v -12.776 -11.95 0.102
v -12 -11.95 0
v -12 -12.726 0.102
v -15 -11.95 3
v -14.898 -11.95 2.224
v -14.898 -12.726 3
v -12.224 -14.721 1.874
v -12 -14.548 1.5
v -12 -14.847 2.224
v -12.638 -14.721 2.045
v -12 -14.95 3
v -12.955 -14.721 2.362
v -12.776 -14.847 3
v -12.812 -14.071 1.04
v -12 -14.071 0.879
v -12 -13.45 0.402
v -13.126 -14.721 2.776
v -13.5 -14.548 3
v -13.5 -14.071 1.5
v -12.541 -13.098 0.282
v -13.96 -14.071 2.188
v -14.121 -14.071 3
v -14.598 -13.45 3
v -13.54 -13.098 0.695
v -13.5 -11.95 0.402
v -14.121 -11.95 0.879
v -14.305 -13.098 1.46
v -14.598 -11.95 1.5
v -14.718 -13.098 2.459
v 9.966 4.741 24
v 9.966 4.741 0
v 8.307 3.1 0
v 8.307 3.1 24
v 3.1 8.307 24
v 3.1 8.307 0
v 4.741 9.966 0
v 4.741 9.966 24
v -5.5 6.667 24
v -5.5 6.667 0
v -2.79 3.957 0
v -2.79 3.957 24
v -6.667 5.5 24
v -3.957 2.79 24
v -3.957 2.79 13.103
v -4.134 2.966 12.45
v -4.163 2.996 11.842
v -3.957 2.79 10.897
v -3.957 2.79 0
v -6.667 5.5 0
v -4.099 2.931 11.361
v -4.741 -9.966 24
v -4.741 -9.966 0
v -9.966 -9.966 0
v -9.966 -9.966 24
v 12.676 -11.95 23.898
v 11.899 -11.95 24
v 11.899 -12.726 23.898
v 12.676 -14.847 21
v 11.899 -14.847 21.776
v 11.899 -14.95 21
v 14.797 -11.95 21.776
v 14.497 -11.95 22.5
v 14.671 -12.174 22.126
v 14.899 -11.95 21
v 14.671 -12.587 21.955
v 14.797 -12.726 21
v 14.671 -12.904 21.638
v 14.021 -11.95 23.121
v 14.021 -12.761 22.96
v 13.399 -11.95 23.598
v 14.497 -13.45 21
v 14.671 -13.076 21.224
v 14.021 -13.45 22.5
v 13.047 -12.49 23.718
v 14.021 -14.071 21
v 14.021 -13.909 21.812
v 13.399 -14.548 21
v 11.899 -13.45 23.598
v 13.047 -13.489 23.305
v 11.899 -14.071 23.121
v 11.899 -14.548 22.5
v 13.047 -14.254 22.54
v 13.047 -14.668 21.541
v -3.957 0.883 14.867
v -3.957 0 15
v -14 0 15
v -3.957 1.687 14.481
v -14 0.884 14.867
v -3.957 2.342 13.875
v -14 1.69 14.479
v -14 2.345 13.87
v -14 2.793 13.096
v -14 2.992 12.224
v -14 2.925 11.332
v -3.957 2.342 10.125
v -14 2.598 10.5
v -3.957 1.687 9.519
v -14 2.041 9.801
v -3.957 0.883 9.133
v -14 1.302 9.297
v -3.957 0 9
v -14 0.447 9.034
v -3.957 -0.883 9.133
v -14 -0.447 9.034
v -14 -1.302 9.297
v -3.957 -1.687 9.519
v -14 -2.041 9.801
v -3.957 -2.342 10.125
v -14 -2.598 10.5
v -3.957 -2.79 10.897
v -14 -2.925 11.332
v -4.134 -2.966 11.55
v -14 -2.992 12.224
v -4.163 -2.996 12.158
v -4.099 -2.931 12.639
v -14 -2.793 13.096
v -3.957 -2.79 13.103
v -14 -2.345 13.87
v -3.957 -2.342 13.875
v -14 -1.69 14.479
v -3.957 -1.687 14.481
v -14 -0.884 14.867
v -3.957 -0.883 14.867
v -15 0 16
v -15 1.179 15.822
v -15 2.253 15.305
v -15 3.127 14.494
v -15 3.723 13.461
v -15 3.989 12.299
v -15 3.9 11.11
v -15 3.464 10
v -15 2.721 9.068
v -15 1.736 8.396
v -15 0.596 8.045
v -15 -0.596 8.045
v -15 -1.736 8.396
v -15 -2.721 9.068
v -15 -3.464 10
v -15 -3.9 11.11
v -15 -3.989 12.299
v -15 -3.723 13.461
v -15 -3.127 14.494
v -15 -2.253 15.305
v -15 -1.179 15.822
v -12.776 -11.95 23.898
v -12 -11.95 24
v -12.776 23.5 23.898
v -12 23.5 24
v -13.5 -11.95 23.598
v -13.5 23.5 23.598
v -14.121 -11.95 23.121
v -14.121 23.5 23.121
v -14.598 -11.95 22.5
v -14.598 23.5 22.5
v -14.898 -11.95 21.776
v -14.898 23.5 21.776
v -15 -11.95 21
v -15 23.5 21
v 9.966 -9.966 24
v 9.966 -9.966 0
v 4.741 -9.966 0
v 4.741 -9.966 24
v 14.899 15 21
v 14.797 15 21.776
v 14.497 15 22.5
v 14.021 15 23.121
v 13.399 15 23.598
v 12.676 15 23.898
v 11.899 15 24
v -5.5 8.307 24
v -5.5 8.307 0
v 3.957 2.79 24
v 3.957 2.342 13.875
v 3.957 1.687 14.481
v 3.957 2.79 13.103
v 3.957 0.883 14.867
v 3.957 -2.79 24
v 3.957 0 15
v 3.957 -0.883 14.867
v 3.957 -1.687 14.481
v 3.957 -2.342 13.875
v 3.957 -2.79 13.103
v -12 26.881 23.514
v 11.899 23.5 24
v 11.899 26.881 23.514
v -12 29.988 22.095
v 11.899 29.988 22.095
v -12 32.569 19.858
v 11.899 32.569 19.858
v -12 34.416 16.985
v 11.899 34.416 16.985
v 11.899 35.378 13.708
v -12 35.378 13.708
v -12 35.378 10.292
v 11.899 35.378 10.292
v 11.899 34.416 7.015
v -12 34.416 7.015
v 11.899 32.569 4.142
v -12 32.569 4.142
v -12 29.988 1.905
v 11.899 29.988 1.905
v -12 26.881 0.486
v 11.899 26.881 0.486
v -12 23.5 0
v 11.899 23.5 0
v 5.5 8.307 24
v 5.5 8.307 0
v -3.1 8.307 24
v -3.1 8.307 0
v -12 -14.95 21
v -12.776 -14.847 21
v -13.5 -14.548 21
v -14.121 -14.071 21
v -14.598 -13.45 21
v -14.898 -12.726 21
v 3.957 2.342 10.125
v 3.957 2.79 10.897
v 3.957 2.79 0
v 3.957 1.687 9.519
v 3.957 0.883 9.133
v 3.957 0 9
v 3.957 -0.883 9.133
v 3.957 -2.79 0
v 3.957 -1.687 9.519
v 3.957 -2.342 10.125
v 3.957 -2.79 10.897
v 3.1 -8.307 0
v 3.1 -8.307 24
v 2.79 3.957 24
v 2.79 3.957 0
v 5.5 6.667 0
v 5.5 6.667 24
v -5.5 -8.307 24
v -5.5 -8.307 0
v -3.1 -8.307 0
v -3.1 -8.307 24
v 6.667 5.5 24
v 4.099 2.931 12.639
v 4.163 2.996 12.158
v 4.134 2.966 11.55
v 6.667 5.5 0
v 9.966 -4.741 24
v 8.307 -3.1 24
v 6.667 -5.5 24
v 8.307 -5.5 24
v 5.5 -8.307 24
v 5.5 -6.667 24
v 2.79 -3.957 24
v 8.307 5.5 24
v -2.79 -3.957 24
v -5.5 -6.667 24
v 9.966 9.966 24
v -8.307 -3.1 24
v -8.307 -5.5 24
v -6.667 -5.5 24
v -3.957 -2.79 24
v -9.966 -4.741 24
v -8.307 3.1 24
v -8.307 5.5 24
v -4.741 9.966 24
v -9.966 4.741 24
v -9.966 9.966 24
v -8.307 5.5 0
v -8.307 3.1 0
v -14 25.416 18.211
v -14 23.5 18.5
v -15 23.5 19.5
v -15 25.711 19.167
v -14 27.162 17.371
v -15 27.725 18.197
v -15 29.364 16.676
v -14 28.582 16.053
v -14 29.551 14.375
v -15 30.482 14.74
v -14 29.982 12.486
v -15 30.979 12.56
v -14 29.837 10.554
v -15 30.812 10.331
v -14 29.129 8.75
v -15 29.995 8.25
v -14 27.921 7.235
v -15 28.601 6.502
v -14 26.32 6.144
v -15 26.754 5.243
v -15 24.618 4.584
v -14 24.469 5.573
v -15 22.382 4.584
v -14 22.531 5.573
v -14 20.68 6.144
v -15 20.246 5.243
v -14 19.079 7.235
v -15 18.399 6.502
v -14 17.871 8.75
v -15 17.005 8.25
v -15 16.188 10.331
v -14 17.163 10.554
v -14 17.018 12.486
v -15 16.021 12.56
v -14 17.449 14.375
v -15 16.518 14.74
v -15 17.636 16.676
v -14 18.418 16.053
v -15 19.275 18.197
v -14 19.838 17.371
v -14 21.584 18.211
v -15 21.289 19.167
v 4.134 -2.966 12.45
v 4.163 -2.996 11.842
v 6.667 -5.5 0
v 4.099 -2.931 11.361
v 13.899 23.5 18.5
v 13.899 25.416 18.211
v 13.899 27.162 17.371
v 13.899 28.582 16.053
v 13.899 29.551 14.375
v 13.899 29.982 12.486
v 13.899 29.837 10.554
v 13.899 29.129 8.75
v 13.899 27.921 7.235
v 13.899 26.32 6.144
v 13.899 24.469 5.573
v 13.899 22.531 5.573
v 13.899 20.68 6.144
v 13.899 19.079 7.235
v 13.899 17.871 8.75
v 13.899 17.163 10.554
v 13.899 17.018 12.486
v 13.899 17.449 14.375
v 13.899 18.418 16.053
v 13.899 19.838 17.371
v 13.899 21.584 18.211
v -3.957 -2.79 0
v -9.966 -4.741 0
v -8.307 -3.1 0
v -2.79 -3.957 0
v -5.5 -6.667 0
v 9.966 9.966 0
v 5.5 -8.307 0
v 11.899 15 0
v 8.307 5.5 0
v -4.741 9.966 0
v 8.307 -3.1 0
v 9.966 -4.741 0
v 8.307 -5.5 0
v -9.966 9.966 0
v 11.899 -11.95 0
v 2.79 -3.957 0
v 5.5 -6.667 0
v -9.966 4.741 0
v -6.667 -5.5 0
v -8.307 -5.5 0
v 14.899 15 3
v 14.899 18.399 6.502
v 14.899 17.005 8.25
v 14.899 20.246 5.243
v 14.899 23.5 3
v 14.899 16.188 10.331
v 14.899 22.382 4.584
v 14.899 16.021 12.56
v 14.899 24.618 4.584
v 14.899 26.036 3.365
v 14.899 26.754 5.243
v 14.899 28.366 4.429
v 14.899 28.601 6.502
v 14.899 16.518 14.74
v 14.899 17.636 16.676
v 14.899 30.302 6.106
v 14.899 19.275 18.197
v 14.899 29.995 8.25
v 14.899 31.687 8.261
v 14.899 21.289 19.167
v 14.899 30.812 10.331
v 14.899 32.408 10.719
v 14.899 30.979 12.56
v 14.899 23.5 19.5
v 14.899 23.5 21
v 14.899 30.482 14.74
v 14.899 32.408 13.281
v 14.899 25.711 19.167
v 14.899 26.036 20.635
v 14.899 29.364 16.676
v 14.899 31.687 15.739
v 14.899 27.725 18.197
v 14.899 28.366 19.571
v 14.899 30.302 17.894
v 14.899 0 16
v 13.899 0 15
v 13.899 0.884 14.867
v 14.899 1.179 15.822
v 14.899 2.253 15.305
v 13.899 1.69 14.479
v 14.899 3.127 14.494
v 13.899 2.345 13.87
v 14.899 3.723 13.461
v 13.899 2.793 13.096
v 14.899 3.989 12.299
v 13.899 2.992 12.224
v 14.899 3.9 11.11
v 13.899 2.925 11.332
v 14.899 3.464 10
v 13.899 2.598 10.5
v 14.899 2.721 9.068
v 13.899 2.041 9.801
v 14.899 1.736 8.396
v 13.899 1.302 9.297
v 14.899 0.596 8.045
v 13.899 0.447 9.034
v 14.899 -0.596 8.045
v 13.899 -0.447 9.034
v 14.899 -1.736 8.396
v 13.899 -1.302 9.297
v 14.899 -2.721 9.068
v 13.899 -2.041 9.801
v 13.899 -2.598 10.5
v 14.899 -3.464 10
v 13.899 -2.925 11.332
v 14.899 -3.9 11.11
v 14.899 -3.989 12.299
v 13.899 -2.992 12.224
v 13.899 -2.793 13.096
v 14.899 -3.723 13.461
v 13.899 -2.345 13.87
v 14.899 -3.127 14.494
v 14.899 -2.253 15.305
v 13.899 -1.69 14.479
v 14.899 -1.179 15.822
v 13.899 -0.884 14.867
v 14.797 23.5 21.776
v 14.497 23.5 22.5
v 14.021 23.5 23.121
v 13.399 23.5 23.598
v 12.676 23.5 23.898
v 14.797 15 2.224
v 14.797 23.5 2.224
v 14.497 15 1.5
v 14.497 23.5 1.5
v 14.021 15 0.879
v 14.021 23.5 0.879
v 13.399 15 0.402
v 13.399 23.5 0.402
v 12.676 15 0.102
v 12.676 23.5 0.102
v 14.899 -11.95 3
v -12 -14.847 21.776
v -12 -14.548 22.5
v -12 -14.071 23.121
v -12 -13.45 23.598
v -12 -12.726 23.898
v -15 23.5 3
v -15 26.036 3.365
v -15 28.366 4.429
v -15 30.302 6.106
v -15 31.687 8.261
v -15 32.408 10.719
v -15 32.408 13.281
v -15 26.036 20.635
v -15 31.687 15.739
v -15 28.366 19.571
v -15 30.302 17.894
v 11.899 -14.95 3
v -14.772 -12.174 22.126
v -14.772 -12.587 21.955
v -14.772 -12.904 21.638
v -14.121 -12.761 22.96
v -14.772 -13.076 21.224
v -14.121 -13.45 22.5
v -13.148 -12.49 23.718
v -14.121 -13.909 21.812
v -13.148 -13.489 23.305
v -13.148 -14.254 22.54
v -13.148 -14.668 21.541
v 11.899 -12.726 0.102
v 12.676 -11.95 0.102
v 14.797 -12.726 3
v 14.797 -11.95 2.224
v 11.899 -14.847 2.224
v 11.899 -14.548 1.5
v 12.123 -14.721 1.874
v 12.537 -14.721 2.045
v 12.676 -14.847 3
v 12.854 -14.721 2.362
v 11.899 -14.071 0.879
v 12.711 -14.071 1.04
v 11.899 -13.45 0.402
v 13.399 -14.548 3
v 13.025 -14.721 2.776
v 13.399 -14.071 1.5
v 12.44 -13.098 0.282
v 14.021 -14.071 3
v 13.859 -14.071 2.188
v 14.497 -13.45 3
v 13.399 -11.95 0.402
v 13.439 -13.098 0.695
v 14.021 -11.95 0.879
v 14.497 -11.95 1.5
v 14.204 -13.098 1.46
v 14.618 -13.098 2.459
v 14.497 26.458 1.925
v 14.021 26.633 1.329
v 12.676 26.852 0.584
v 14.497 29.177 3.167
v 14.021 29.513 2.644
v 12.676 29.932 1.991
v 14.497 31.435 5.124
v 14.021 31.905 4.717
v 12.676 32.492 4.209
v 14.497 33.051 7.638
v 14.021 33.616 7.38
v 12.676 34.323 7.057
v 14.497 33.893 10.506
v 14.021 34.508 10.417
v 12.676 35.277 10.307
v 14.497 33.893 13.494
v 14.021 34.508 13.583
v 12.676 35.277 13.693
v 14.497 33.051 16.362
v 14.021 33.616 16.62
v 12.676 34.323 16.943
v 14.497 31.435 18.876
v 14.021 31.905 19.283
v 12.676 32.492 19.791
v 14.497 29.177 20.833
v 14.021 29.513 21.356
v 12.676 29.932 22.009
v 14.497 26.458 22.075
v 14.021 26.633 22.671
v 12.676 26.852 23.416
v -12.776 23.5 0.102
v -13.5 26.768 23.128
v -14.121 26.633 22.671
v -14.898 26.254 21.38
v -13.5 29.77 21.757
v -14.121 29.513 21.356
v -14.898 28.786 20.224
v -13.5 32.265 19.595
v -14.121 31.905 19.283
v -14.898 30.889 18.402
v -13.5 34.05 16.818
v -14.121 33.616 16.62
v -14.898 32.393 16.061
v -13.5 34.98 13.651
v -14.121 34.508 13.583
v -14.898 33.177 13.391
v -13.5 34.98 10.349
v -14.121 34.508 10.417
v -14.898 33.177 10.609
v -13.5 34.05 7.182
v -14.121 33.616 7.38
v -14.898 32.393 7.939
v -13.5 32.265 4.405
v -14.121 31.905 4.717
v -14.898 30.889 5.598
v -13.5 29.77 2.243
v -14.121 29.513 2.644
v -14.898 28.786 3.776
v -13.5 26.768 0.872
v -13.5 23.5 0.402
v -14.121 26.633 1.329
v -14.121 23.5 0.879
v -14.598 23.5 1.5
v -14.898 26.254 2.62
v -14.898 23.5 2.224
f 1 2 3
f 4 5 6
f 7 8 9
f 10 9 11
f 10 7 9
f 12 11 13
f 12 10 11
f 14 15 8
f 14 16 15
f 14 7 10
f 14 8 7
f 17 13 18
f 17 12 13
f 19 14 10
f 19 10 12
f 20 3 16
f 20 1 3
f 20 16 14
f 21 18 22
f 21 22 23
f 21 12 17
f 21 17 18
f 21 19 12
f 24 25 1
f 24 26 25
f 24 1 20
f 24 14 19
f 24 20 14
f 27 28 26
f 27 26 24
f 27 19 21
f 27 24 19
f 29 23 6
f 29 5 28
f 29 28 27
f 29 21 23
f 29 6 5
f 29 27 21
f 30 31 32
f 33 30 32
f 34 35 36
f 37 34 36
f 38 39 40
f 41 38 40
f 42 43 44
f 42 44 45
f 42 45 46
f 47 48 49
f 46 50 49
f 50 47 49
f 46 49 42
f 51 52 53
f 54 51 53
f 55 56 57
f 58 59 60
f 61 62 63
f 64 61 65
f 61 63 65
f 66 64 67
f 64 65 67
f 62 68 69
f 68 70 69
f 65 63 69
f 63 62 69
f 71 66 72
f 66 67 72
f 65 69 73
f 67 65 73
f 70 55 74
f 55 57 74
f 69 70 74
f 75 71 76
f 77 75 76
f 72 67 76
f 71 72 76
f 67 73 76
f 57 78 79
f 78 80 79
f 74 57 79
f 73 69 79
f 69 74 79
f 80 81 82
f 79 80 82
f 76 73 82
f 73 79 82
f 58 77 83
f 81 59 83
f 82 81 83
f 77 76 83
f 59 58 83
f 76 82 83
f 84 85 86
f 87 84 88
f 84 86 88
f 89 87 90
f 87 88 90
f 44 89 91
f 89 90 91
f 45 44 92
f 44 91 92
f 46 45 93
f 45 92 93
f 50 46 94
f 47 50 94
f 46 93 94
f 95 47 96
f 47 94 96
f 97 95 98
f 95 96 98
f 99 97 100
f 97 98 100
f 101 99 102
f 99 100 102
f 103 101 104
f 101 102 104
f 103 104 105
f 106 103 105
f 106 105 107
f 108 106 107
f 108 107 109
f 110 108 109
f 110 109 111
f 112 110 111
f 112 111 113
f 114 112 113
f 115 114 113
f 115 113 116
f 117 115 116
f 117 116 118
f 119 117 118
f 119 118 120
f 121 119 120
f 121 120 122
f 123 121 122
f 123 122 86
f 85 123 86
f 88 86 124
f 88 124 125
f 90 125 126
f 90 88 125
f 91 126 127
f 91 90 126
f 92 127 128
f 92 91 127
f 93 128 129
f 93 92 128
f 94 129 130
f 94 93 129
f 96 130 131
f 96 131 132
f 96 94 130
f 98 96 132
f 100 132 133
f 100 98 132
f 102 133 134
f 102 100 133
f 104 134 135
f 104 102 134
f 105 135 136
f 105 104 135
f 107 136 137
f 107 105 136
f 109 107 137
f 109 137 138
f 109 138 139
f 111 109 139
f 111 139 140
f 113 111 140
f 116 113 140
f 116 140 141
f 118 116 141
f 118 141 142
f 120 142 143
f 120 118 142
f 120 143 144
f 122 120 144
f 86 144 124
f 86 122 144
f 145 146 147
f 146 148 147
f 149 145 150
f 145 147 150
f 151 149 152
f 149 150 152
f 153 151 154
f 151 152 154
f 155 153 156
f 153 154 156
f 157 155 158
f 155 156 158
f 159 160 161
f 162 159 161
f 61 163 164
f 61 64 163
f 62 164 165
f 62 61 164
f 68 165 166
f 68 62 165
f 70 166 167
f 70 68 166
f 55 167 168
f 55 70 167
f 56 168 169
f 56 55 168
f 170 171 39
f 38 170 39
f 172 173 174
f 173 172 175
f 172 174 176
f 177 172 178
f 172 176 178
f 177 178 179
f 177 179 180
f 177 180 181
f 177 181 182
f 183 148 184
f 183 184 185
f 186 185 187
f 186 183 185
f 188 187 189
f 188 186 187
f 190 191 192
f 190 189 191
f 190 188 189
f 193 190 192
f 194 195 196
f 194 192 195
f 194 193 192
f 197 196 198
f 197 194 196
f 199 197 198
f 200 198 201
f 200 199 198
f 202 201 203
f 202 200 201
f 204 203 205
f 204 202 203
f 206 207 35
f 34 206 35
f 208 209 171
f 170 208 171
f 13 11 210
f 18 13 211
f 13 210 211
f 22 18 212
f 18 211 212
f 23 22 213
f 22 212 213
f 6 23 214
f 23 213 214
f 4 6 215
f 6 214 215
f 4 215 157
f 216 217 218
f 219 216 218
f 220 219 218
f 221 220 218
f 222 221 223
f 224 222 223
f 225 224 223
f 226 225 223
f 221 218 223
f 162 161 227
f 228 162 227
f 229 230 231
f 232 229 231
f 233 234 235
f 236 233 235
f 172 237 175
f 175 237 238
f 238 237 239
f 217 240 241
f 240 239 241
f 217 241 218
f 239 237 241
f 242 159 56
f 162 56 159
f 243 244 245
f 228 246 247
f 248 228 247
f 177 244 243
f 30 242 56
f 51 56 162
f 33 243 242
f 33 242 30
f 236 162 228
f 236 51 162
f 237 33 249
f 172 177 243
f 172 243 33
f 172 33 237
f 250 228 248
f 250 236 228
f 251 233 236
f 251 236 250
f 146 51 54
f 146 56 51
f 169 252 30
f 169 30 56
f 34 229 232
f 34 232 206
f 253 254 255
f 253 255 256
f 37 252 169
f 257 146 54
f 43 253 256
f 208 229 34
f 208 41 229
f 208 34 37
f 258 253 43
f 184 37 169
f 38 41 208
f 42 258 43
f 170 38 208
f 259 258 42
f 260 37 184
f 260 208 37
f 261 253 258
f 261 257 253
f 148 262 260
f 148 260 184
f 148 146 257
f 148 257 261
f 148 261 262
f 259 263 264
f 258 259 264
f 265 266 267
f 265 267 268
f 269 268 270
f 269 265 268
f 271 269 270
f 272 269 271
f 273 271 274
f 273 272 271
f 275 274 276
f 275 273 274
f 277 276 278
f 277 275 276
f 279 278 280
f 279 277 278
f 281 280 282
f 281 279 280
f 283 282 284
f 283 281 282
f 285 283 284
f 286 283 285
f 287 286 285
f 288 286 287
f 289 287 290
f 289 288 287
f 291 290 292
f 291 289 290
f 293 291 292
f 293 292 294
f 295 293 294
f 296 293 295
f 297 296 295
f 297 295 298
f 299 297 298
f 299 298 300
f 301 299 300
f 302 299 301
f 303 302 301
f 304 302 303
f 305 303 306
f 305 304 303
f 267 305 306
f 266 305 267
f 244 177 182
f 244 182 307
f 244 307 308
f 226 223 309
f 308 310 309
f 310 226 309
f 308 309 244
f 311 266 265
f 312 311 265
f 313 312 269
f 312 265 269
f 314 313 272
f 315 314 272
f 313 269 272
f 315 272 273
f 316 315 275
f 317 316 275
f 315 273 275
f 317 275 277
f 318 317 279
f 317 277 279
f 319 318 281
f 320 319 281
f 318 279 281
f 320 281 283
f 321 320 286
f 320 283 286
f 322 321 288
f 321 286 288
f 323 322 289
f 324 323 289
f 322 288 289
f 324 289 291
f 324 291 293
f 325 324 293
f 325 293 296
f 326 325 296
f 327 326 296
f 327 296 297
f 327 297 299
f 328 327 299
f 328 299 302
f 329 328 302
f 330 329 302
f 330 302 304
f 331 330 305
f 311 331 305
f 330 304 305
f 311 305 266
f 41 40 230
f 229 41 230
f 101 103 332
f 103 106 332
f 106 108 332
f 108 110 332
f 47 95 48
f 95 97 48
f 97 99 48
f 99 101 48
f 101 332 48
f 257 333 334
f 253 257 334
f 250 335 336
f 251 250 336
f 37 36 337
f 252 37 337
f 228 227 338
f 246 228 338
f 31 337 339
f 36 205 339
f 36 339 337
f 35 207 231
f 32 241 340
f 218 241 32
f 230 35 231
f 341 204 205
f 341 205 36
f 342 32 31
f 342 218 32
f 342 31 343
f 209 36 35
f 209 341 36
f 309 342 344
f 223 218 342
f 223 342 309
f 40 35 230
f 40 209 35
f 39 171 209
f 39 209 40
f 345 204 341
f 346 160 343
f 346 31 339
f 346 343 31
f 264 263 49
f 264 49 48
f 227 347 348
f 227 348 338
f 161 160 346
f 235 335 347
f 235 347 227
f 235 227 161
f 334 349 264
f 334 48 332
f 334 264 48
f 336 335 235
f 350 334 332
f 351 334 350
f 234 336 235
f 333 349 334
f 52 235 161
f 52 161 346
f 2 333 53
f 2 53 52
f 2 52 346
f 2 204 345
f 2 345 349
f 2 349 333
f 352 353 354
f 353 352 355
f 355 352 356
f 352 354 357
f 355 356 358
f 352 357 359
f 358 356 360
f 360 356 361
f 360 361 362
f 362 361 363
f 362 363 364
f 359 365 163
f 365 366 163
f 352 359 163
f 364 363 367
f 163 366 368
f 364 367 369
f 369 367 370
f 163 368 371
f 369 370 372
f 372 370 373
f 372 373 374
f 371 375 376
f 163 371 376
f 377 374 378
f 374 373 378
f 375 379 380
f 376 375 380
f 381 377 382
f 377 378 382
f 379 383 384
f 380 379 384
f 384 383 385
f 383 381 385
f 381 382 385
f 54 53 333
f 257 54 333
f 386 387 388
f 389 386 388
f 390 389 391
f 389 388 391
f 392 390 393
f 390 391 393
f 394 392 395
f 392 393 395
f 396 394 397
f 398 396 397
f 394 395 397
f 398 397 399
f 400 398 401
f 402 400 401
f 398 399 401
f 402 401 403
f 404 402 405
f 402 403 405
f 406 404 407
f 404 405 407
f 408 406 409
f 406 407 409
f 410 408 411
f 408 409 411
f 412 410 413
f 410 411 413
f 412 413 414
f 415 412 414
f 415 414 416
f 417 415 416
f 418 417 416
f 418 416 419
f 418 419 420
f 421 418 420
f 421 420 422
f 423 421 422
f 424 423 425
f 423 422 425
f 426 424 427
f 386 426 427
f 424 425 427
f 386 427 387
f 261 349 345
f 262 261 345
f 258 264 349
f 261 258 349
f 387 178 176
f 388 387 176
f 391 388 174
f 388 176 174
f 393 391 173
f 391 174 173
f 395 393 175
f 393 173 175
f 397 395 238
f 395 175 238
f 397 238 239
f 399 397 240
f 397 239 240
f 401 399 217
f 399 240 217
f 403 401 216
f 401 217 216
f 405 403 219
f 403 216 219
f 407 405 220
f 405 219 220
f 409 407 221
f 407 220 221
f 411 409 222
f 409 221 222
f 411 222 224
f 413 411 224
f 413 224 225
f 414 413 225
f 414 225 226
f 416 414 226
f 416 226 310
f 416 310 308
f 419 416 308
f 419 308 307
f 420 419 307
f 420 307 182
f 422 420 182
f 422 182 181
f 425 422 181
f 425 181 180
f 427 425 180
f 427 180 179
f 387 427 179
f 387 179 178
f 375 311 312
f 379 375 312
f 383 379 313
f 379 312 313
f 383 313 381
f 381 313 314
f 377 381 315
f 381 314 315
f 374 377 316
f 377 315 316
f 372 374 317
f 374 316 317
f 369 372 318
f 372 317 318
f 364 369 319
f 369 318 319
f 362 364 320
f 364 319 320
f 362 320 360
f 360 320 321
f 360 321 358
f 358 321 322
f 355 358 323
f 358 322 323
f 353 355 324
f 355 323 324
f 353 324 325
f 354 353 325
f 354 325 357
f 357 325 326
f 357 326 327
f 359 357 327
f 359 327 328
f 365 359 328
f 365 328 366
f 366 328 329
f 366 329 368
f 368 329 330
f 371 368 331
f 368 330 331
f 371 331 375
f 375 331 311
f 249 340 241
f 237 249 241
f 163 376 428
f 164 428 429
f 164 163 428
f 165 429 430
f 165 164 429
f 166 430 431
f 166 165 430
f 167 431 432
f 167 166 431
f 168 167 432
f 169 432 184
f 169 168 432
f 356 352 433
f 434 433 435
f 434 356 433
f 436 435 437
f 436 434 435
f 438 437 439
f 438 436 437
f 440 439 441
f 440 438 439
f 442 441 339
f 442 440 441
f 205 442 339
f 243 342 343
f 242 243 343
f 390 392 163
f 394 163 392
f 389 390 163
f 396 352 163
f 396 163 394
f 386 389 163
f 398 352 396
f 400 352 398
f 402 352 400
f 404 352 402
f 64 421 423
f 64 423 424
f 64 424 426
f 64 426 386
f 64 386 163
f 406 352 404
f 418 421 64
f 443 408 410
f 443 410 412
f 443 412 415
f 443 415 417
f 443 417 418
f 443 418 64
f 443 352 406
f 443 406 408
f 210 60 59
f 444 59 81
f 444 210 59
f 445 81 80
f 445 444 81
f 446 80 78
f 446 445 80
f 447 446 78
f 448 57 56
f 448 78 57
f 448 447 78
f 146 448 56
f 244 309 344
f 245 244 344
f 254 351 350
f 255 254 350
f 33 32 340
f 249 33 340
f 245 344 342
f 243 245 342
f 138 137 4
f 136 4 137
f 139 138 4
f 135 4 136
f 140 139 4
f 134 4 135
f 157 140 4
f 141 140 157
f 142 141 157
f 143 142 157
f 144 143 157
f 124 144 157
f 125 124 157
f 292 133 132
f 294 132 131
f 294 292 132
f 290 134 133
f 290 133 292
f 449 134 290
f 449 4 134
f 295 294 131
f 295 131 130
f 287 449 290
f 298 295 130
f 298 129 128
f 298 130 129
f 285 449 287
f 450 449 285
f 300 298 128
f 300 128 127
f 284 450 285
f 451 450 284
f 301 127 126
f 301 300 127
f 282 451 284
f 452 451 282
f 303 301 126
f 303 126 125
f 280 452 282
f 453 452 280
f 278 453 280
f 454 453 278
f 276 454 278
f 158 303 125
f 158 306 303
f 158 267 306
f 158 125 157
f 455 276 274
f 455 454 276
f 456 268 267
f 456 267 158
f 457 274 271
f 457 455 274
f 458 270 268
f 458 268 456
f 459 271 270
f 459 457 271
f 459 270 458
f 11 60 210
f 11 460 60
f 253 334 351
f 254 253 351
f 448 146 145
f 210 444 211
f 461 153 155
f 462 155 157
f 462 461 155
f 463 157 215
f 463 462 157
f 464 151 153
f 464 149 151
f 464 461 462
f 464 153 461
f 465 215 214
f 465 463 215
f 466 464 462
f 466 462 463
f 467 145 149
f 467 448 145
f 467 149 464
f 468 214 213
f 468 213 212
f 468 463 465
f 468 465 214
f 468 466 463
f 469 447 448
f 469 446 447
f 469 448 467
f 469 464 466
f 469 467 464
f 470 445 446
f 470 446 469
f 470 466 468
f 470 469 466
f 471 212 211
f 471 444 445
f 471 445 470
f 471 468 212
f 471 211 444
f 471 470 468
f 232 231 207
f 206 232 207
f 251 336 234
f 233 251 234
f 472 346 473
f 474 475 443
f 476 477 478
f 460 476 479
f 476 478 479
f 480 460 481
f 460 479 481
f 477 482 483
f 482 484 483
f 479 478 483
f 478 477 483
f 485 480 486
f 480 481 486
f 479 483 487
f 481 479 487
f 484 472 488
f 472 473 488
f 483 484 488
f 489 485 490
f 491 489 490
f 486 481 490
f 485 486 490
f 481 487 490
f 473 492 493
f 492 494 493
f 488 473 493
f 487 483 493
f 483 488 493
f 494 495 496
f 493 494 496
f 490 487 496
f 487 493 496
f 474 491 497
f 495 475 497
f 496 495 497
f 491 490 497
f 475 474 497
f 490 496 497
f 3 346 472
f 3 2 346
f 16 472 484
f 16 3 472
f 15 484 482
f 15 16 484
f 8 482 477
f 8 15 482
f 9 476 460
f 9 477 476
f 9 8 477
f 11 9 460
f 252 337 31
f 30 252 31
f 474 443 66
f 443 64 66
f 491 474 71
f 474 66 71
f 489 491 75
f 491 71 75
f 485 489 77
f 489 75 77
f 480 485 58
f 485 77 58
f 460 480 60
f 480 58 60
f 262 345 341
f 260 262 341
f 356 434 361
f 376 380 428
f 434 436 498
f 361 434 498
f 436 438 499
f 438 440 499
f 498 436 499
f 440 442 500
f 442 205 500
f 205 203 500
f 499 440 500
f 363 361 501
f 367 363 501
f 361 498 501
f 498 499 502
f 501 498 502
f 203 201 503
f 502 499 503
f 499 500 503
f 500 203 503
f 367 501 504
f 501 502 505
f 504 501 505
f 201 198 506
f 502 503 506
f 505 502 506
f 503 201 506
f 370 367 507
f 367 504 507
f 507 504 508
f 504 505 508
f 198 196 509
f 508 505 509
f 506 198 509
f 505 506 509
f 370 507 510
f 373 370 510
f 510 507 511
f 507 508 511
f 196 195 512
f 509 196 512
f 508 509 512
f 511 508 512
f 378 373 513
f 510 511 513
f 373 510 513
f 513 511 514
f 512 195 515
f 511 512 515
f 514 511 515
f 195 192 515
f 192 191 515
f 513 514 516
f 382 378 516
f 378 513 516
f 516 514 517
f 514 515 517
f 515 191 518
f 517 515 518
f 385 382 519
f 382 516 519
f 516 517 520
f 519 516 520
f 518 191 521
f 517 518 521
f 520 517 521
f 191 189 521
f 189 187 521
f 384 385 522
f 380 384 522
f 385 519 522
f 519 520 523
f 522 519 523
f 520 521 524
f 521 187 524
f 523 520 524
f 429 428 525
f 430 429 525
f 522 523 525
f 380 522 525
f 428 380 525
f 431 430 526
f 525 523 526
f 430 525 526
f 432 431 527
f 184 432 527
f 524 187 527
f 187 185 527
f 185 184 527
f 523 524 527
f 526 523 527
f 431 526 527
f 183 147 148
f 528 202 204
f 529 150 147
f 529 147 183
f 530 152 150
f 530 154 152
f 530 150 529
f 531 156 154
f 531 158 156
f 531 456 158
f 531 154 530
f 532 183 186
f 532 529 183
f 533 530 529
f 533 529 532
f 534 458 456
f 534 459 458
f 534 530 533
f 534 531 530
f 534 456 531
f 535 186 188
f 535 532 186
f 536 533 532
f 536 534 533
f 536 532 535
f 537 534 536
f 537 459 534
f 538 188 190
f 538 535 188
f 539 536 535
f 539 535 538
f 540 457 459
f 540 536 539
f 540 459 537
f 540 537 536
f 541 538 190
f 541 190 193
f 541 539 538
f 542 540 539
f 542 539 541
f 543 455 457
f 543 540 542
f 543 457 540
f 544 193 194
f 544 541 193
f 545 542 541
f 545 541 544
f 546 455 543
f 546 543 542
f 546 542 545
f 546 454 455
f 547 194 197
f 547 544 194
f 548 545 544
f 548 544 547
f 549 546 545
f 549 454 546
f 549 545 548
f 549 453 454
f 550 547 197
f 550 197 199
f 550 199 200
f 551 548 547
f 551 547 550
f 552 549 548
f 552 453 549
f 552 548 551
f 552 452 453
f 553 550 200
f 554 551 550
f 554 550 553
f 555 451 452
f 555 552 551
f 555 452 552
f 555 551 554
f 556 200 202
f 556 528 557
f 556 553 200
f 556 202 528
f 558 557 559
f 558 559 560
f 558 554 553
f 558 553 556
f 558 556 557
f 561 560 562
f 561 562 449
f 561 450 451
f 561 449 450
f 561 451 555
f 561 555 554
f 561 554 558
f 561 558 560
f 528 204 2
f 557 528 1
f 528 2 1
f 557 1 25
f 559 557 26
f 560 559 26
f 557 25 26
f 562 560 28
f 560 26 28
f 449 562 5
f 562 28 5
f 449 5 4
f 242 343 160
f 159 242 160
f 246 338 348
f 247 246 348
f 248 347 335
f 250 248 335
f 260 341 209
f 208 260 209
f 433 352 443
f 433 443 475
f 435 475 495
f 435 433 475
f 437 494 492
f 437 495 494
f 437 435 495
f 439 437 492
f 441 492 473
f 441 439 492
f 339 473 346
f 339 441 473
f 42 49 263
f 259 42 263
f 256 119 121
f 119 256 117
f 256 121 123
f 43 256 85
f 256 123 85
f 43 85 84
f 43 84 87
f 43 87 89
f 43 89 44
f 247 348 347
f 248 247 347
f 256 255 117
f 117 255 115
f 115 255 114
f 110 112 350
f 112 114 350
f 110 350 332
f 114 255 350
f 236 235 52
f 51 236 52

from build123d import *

# Parameters (mm, degrees)
BOSS_EXTRUDE1_DEPTH = 24
SKETCH5_R           = 6.5
BOSS_EXTRUDE3_DEPTH = 29.899298
SKETCH3_R           = 3
CUT_EXTRUDE1_DEPTH  = 30.899298428
FILLET1_R           = 3
CHAMFER1_SIZE       = 1


with BuildPart() as part:
    # Sketch1 → Boss-Extrude1 (new body)
    with BuildSketch(Plane.XY):
        Polygon((0, 15), (14.899298428, 15), (14.899298428, -14.949649214), (-15, -14.949649214), (-15, 15), align=None)
        Polygon((-9.966432809, 9.966432809), (-4.741432809, 9.966432809), (-3.1, 8.307461143), (-5.5, 8.307461143), (-5.5, 6.667461143), (-2.79, 3.957461143), (2.79, 3.957461143), (5.5, 6.667461143), (5.5, 8.307461143), (3.1, 8.307461143), (4.741432809, 9.966432809), (9.966432809, 9.966432809), (9.966432809, 4.741432809), (8.307461143, 3.1), (8.307461143, 5.5), (6.667461143, 5.5), (3.957461143, 2.79), (3.957461143, -2.79), (6.667461143, -5.5), (8.307461143, -5.5), (8.307461143, -3.1), (9.966432809, -4.741432809), (9.966432809, -9.966432809), (4.741432809, -9.966432809), (3.1, -8.307461143), (5.5, -8.307461143), (5.5, -6.667461143), (2.79, -3.957461143), (-2.79, -3.957461143), (-5.5, -6.667461143), (-5.5, -8.307461143), (-3.1, -8.307461143), (-4.741432809, -9.966432809), (-9.966432809, -9.966432809), (-9.966432809, -4.741432809), (-8.307461143, -3.1), (-8.307461143, -5.5), (-6.667461143, -5.5), (-3.957461143, -2.79), (-3.957461143, 2.79), (-6.667461143, 5.5), (-8.307461143, 5.5), (-8.307461143, 3.1), (-9.966432809, 4.741432809), align=None, mode=Mode.SUBTRACT)
    extrude(amount=BOSS_EXTRUDE1_DEPTH)

    # Sketch5 → Boss-Extrude3 (add, through all)
    with BuildSketch(Plane.ZY.offset(15)):
        with BuildLine():
            Line((0, 15), (24, 15))
            Line((24, 15), (24, 23.5))
            ThreePointArc((24, 23.5), (12, 35.5), (0, 23.5))
            Line((0, 23.5), (0, 15))
        make_face()
        with Locations((12, 23.5)):
            Circle(SKETCH5_R, mode=Mode.SUBTRACT)
    extrude(amount=-BOSS_EXTRUDE3_DEPTH)

    # Sketch3 → Cut-Extrude1 (cut, through all)
    with BuildSketch(Plane.ZY.offset(15)):
        with Locations((12, 0)):
            Circle(SKETCH3_R)
    extrude(amount=-CUT_EXTRUDE1_DEPTH, mode=Mode.SUBTRACT)

    # Fillet1
    fillet1_edges = [part.edges().sort_by_distance(p)[0] for p in [
        (-0.050350786, -14.949649214, 24),
        (14.899298428, 0.025175393, 24),
        (14.899298, 35.5, 12),
        (-15, 35.5, 12),
        (14.899298428, 0.025175393, 0),
        (-0.050350786, -14.949649214, 0),
        (-15, 4.275175393, 0),
        (-15, 4.275175393, 24),
        (14.899298428, -14.949649214, 12),
        (-15, -14.949649214, 12),
    ]]
    fillet(fillet1_edges, radius=FILLET1_R)

    # Chamfer1
    chamfer1_edges = [part.edges().sort_by_distance(p)[0] for p in [
        (14.899298, 23.5, 5.5),
        (-15, 23.5, 5.5),
        (14.899298428, 0, 9),
        (-15, 0, 9),
    ]]
    chamfer(chamfer1_edges, length=CHAMFER1_SIZE)


solid = part.part
